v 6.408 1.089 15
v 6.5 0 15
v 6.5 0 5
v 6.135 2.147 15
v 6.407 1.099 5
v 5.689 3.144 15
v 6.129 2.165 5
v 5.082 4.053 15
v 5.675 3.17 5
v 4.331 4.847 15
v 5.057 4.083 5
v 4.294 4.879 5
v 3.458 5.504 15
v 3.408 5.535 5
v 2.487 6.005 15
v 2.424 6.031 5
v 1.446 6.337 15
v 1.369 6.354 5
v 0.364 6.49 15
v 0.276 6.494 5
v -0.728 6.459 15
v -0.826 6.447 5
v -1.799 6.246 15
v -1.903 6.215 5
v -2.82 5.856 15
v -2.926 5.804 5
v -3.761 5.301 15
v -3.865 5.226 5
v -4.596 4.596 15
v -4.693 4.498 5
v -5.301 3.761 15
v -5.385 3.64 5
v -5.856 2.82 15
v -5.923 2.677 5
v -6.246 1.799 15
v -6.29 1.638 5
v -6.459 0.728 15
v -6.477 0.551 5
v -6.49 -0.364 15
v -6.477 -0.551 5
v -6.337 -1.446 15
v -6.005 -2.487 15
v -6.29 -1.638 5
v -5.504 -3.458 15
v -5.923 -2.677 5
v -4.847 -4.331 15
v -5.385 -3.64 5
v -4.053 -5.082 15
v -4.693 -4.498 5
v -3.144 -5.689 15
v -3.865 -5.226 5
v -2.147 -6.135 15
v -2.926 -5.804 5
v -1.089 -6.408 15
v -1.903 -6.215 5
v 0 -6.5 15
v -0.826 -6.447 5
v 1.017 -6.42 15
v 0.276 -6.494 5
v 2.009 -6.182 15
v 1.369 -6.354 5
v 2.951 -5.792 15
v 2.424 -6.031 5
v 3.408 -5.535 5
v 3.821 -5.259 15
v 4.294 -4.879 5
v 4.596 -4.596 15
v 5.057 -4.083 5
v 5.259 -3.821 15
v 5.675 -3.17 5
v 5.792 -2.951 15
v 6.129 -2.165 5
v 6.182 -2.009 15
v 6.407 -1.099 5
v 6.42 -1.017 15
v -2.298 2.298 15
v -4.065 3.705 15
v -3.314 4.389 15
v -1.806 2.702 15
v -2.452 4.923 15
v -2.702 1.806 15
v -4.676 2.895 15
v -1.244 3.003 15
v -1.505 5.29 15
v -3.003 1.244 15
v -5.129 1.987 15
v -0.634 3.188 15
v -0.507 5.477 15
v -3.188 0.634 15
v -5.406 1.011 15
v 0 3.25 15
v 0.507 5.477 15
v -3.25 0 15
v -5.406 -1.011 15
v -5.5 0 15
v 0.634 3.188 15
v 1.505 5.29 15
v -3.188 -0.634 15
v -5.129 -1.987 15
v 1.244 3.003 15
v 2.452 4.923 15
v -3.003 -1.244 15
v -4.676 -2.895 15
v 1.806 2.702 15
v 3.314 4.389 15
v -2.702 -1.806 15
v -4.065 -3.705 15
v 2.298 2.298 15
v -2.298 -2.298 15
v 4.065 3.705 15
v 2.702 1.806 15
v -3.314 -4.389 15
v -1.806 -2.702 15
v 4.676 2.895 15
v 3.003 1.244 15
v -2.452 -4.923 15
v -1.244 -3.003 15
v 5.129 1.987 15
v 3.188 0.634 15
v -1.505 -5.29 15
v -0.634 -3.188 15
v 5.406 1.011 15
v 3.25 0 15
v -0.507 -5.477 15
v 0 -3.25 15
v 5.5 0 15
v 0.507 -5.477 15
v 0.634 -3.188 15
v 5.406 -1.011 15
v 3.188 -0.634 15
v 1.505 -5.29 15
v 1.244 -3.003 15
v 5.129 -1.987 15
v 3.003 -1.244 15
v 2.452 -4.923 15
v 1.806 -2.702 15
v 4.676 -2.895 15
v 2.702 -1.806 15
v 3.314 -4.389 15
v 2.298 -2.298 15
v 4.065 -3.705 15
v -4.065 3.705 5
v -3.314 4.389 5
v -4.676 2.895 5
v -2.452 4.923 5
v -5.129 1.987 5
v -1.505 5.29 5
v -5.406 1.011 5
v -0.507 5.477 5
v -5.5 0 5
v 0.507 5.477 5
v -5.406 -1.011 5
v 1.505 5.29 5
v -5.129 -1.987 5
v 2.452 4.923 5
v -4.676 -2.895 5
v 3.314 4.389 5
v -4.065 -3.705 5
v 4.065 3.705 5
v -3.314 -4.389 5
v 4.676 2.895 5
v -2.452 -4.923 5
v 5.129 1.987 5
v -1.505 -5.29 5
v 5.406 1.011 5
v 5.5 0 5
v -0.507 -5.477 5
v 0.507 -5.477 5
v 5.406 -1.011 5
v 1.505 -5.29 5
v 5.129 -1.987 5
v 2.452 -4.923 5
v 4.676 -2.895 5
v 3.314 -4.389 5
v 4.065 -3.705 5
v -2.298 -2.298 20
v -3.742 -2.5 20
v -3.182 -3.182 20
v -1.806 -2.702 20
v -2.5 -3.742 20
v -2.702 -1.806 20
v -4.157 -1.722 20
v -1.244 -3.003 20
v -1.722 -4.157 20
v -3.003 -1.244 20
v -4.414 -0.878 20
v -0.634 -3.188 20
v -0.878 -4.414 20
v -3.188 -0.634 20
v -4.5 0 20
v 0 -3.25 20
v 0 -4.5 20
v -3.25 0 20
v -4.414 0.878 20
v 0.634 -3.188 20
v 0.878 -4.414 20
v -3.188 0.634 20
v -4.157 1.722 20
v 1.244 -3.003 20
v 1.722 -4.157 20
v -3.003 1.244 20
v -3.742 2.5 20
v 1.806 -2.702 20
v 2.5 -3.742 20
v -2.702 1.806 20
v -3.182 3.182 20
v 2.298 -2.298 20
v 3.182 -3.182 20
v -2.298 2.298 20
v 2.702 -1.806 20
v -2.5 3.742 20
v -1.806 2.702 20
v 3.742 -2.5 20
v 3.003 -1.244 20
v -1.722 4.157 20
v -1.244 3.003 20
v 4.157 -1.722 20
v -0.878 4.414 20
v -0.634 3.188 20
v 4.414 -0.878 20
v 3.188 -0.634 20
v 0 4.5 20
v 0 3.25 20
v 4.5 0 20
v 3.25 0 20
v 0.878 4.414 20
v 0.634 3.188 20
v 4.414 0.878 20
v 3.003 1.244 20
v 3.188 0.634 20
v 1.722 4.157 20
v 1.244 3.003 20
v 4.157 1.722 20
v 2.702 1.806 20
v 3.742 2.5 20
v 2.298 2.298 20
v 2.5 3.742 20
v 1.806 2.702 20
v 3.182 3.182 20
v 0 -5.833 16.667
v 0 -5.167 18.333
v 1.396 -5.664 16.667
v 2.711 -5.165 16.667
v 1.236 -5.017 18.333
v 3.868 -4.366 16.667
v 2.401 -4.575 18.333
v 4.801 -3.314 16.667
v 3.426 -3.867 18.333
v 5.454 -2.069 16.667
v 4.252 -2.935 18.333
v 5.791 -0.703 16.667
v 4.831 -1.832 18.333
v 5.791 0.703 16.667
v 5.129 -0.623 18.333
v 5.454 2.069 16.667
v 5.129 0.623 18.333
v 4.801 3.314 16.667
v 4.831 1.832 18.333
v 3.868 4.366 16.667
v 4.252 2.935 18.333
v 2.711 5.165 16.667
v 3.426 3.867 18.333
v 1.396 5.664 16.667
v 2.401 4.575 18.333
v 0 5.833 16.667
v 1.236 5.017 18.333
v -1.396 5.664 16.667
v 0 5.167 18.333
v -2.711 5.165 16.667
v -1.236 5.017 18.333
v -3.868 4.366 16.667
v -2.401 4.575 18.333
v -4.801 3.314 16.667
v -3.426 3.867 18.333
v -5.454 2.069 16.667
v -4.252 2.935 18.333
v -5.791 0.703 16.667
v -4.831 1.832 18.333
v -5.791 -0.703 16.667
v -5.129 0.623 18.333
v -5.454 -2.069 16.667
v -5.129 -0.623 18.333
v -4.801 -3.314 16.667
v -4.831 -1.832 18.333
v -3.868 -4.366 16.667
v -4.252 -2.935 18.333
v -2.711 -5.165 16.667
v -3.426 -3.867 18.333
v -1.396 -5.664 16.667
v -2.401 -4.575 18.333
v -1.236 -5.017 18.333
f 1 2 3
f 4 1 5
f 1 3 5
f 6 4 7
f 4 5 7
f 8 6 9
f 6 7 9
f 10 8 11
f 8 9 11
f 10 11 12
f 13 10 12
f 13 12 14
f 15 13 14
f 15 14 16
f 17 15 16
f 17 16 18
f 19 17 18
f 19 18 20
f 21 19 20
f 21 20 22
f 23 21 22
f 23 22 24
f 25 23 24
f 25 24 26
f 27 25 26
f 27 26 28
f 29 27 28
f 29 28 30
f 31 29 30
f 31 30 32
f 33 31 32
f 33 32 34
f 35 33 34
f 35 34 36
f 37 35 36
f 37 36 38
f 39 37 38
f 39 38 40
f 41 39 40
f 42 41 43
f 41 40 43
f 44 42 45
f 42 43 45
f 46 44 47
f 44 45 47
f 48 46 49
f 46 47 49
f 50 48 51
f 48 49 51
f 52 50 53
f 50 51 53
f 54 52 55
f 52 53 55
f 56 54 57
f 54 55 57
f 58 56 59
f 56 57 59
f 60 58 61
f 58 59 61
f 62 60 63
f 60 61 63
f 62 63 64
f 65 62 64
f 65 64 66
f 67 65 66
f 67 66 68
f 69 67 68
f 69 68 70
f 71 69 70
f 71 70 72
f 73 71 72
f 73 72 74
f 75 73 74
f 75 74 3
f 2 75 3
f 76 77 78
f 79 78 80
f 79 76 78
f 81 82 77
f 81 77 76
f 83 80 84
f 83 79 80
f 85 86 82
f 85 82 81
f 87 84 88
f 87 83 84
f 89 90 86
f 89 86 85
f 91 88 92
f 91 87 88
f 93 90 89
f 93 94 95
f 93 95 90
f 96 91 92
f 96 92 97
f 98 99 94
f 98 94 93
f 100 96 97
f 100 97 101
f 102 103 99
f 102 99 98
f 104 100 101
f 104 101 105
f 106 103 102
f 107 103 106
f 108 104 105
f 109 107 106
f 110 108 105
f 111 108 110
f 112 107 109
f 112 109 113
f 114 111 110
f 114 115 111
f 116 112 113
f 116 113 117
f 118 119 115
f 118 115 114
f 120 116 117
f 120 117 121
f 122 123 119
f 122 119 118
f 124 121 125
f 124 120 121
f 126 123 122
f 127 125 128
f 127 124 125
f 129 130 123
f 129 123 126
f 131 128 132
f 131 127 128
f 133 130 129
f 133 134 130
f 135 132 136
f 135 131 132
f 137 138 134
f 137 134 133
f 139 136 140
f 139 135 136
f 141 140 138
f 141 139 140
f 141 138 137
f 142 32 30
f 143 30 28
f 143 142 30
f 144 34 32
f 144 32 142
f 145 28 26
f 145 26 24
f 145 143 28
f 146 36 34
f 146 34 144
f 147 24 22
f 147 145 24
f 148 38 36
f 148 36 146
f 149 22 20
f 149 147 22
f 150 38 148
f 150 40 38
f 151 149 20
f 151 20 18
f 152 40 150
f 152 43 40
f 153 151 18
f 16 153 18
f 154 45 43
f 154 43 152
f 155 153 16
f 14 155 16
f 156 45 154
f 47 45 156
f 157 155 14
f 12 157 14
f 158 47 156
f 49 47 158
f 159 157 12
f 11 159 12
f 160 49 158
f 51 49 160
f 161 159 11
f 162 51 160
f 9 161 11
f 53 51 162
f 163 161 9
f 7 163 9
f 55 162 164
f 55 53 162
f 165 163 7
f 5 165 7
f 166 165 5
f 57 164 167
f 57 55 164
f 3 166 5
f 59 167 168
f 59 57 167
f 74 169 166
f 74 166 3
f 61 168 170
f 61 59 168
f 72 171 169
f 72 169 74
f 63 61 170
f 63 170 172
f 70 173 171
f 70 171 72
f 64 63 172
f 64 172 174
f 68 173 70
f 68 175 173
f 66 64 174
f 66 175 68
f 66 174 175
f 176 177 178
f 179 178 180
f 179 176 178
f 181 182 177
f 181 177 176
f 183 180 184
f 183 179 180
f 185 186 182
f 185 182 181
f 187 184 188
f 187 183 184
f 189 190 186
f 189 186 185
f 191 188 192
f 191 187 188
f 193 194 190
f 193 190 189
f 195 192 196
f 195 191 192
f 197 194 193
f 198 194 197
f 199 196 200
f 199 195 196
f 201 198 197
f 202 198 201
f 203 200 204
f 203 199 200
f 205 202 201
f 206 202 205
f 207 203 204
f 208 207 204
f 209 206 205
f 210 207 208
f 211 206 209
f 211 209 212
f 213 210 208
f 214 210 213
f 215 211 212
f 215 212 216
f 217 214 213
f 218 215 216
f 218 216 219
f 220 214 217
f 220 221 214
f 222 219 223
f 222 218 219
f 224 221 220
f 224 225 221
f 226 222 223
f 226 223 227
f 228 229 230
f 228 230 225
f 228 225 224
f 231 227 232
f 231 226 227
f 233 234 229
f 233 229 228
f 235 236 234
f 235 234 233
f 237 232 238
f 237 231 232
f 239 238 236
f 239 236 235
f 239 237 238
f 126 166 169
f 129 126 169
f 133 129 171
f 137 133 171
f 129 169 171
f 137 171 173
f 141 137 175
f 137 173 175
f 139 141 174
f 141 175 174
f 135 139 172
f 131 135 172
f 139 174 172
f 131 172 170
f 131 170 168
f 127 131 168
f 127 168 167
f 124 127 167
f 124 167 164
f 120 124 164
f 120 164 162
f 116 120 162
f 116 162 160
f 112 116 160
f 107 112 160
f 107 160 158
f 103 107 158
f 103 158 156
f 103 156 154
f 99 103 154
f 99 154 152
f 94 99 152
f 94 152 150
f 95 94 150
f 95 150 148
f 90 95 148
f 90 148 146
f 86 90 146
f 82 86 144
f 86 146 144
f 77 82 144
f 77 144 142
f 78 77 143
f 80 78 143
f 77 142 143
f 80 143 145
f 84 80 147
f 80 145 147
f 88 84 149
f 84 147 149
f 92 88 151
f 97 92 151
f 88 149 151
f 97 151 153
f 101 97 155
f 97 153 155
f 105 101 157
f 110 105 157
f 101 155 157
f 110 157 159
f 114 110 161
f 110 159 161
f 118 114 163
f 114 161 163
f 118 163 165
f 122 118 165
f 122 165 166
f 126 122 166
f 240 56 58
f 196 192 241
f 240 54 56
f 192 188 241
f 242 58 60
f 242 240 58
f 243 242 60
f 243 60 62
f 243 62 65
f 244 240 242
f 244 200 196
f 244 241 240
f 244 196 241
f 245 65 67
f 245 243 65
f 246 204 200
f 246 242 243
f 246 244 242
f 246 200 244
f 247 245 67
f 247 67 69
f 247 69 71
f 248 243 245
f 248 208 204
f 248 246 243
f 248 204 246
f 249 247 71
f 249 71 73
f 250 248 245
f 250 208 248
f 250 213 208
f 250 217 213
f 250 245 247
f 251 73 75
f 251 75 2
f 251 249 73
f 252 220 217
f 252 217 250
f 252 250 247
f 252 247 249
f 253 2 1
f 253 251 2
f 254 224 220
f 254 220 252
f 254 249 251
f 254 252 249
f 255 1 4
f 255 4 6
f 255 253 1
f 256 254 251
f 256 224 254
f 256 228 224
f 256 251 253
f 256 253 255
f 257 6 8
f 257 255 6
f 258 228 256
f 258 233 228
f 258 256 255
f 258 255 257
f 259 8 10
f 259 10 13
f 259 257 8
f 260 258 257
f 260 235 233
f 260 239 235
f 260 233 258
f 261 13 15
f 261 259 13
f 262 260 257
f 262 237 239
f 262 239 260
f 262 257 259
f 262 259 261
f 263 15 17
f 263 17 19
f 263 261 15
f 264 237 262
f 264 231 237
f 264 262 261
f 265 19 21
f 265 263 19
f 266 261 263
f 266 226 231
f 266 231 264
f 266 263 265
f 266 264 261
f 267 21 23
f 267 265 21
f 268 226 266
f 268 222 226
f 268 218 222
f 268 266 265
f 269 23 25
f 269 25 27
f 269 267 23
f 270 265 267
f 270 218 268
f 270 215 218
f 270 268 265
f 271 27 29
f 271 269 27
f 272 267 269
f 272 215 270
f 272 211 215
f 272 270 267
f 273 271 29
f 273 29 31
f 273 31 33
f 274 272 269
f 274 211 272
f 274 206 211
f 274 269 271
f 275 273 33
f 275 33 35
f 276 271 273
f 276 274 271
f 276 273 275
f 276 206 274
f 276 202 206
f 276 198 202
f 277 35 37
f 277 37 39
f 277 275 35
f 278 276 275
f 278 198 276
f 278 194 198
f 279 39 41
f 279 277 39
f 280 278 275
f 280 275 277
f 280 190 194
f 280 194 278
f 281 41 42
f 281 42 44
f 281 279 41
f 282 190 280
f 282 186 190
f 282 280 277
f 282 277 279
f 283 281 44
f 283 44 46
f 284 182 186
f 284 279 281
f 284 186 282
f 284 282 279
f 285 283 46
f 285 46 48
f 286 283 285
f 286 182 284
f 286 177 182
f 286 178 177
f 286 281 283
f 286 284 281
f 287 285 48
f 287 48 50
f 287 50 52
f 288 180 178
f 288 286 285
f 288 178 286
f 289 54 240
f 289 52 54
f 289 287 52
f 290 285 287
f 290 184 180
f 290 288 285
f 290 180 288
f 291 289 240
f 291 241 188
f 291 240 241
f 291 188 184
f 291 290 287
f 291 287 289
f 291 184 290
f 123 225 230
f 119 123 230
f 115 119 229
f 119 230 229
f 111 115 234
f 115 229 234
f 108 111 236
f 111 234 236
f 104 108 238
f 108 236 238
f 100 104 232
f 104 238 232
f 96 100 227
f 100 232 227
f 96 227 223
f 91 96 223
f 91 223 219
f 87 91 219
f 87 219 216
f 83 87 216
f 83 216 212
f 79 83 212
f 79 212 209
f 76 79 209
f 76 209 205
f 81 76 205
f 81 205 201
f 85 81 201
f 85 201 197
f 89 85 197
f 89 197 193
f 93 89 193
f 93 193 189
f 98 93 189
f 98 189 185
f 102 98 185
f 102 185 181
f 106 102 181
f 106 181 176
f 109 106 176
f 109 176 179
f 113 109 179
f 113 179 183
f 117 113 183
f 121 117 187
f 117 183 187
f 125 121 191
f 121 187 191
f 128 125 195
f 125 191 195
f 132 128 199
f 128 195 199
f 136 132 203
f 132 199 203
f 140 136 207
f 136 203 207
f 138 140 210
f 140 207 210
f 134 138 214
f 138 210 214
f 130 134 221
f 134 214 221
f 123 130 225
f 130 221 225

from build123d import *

# Parameters (mm, degrees)
SKETCH177_R     = 6.5
PAD072_DEPTH    = 20
SKETCH178_R     = 3.25
POCKET069_DEPTH = 20.001
SKETCH179_R     = 5.5
POCKET070_DEPTH = 15
SKETCH180_W     = 0.76168
SKETCH180_H     = 6.5
PAD073_DEPTH    = 2
SKETCH182_W     = 6.5
SKETCH182_H     = 2
POCKET071_DEPTH = 6.501
SKETCH183_R     = 7.331051
POCKET072_DEPTH = 5


with BuildPart() as part:
    # Sketch177 → Pad072 (new body)
    with BuildSketch(Plane.XY):
        Circle(SKETCH177_R)
    extrude(amount=PAD072_DEPTH)

    # Sketch178 (on Face3 of Pad072) → Pocket069 (cut, through all)
    with BuildSketch(Plane.XY.offset(20)):
        Circle(SKETCH178_R)
    extrude(amount=-POCKET069_DEPTH, mode=Mode.SUBTRACT)

    # Sketch179 (on Face2 of Pocket069) → Pocket070 (cut)
    with BuildSketch(Plane(origin=(0, 0, 0), x_dir=(1, 0, 0), z_dir=(0, 0, -1))):
        Circle(SKETCH179_R)
    extrude(amount=-POCKET070_DEPTH, mode=Mode.SUBTRACT)

    # Sketch180 (on Face3 of Pocket070) → Pad073 (join)
    with BuildSketch(Plane.XY.offset(20)):
        with Locations((0.38084, -3.25)):
            Rectangle(SKETCH180_W, SKETCH180_H)
    extrude(amount=PAD073_DEPTH)

    # Sketch181 (on Face9 of Pad073) → Groove001 (revolve, cut)
    with BuildSketch(Plane(origin=(0, 0, 0), x_dir=(0, -1, 0), z_dir=(-1, 0, 0))):
        Polygon((4.5, 20), (6.5, 20), (6.5, 15), align=None)
    revolve(axis=Axis((0, 0, 0), (0, 0, 1)), mode=Mode.SUBTRACT)

    # Sketch182 (on Face9 of Groove001) → Pocket071 (cut, through all)
    with BuildSketch(Plane(origin=(0, 0, 0), x_dir=(0, -1, 0), z_dir=(-1, 0, 0))):
        with Locations((3.25, 21)):
            Rectangle(SKETCH182_W, SKETCH182_H)
    extrude(amount=-POCKET071_DEPTH, mode=Mode.SUBTRACT)

    # Sketch183 (on Face1 of Pocket071) → Pocket072 (cut)
    with BuildSketch(Plane(origin=(0, 0, 0), x_dir=(1, 0, 0), z_dir=(0, 0, -1))):
        Circle(SKETCH183_R)
    extrude(amount=-POCKET072_DEPTH, mode=Mode.SUBTRACT)


solid = part.part
